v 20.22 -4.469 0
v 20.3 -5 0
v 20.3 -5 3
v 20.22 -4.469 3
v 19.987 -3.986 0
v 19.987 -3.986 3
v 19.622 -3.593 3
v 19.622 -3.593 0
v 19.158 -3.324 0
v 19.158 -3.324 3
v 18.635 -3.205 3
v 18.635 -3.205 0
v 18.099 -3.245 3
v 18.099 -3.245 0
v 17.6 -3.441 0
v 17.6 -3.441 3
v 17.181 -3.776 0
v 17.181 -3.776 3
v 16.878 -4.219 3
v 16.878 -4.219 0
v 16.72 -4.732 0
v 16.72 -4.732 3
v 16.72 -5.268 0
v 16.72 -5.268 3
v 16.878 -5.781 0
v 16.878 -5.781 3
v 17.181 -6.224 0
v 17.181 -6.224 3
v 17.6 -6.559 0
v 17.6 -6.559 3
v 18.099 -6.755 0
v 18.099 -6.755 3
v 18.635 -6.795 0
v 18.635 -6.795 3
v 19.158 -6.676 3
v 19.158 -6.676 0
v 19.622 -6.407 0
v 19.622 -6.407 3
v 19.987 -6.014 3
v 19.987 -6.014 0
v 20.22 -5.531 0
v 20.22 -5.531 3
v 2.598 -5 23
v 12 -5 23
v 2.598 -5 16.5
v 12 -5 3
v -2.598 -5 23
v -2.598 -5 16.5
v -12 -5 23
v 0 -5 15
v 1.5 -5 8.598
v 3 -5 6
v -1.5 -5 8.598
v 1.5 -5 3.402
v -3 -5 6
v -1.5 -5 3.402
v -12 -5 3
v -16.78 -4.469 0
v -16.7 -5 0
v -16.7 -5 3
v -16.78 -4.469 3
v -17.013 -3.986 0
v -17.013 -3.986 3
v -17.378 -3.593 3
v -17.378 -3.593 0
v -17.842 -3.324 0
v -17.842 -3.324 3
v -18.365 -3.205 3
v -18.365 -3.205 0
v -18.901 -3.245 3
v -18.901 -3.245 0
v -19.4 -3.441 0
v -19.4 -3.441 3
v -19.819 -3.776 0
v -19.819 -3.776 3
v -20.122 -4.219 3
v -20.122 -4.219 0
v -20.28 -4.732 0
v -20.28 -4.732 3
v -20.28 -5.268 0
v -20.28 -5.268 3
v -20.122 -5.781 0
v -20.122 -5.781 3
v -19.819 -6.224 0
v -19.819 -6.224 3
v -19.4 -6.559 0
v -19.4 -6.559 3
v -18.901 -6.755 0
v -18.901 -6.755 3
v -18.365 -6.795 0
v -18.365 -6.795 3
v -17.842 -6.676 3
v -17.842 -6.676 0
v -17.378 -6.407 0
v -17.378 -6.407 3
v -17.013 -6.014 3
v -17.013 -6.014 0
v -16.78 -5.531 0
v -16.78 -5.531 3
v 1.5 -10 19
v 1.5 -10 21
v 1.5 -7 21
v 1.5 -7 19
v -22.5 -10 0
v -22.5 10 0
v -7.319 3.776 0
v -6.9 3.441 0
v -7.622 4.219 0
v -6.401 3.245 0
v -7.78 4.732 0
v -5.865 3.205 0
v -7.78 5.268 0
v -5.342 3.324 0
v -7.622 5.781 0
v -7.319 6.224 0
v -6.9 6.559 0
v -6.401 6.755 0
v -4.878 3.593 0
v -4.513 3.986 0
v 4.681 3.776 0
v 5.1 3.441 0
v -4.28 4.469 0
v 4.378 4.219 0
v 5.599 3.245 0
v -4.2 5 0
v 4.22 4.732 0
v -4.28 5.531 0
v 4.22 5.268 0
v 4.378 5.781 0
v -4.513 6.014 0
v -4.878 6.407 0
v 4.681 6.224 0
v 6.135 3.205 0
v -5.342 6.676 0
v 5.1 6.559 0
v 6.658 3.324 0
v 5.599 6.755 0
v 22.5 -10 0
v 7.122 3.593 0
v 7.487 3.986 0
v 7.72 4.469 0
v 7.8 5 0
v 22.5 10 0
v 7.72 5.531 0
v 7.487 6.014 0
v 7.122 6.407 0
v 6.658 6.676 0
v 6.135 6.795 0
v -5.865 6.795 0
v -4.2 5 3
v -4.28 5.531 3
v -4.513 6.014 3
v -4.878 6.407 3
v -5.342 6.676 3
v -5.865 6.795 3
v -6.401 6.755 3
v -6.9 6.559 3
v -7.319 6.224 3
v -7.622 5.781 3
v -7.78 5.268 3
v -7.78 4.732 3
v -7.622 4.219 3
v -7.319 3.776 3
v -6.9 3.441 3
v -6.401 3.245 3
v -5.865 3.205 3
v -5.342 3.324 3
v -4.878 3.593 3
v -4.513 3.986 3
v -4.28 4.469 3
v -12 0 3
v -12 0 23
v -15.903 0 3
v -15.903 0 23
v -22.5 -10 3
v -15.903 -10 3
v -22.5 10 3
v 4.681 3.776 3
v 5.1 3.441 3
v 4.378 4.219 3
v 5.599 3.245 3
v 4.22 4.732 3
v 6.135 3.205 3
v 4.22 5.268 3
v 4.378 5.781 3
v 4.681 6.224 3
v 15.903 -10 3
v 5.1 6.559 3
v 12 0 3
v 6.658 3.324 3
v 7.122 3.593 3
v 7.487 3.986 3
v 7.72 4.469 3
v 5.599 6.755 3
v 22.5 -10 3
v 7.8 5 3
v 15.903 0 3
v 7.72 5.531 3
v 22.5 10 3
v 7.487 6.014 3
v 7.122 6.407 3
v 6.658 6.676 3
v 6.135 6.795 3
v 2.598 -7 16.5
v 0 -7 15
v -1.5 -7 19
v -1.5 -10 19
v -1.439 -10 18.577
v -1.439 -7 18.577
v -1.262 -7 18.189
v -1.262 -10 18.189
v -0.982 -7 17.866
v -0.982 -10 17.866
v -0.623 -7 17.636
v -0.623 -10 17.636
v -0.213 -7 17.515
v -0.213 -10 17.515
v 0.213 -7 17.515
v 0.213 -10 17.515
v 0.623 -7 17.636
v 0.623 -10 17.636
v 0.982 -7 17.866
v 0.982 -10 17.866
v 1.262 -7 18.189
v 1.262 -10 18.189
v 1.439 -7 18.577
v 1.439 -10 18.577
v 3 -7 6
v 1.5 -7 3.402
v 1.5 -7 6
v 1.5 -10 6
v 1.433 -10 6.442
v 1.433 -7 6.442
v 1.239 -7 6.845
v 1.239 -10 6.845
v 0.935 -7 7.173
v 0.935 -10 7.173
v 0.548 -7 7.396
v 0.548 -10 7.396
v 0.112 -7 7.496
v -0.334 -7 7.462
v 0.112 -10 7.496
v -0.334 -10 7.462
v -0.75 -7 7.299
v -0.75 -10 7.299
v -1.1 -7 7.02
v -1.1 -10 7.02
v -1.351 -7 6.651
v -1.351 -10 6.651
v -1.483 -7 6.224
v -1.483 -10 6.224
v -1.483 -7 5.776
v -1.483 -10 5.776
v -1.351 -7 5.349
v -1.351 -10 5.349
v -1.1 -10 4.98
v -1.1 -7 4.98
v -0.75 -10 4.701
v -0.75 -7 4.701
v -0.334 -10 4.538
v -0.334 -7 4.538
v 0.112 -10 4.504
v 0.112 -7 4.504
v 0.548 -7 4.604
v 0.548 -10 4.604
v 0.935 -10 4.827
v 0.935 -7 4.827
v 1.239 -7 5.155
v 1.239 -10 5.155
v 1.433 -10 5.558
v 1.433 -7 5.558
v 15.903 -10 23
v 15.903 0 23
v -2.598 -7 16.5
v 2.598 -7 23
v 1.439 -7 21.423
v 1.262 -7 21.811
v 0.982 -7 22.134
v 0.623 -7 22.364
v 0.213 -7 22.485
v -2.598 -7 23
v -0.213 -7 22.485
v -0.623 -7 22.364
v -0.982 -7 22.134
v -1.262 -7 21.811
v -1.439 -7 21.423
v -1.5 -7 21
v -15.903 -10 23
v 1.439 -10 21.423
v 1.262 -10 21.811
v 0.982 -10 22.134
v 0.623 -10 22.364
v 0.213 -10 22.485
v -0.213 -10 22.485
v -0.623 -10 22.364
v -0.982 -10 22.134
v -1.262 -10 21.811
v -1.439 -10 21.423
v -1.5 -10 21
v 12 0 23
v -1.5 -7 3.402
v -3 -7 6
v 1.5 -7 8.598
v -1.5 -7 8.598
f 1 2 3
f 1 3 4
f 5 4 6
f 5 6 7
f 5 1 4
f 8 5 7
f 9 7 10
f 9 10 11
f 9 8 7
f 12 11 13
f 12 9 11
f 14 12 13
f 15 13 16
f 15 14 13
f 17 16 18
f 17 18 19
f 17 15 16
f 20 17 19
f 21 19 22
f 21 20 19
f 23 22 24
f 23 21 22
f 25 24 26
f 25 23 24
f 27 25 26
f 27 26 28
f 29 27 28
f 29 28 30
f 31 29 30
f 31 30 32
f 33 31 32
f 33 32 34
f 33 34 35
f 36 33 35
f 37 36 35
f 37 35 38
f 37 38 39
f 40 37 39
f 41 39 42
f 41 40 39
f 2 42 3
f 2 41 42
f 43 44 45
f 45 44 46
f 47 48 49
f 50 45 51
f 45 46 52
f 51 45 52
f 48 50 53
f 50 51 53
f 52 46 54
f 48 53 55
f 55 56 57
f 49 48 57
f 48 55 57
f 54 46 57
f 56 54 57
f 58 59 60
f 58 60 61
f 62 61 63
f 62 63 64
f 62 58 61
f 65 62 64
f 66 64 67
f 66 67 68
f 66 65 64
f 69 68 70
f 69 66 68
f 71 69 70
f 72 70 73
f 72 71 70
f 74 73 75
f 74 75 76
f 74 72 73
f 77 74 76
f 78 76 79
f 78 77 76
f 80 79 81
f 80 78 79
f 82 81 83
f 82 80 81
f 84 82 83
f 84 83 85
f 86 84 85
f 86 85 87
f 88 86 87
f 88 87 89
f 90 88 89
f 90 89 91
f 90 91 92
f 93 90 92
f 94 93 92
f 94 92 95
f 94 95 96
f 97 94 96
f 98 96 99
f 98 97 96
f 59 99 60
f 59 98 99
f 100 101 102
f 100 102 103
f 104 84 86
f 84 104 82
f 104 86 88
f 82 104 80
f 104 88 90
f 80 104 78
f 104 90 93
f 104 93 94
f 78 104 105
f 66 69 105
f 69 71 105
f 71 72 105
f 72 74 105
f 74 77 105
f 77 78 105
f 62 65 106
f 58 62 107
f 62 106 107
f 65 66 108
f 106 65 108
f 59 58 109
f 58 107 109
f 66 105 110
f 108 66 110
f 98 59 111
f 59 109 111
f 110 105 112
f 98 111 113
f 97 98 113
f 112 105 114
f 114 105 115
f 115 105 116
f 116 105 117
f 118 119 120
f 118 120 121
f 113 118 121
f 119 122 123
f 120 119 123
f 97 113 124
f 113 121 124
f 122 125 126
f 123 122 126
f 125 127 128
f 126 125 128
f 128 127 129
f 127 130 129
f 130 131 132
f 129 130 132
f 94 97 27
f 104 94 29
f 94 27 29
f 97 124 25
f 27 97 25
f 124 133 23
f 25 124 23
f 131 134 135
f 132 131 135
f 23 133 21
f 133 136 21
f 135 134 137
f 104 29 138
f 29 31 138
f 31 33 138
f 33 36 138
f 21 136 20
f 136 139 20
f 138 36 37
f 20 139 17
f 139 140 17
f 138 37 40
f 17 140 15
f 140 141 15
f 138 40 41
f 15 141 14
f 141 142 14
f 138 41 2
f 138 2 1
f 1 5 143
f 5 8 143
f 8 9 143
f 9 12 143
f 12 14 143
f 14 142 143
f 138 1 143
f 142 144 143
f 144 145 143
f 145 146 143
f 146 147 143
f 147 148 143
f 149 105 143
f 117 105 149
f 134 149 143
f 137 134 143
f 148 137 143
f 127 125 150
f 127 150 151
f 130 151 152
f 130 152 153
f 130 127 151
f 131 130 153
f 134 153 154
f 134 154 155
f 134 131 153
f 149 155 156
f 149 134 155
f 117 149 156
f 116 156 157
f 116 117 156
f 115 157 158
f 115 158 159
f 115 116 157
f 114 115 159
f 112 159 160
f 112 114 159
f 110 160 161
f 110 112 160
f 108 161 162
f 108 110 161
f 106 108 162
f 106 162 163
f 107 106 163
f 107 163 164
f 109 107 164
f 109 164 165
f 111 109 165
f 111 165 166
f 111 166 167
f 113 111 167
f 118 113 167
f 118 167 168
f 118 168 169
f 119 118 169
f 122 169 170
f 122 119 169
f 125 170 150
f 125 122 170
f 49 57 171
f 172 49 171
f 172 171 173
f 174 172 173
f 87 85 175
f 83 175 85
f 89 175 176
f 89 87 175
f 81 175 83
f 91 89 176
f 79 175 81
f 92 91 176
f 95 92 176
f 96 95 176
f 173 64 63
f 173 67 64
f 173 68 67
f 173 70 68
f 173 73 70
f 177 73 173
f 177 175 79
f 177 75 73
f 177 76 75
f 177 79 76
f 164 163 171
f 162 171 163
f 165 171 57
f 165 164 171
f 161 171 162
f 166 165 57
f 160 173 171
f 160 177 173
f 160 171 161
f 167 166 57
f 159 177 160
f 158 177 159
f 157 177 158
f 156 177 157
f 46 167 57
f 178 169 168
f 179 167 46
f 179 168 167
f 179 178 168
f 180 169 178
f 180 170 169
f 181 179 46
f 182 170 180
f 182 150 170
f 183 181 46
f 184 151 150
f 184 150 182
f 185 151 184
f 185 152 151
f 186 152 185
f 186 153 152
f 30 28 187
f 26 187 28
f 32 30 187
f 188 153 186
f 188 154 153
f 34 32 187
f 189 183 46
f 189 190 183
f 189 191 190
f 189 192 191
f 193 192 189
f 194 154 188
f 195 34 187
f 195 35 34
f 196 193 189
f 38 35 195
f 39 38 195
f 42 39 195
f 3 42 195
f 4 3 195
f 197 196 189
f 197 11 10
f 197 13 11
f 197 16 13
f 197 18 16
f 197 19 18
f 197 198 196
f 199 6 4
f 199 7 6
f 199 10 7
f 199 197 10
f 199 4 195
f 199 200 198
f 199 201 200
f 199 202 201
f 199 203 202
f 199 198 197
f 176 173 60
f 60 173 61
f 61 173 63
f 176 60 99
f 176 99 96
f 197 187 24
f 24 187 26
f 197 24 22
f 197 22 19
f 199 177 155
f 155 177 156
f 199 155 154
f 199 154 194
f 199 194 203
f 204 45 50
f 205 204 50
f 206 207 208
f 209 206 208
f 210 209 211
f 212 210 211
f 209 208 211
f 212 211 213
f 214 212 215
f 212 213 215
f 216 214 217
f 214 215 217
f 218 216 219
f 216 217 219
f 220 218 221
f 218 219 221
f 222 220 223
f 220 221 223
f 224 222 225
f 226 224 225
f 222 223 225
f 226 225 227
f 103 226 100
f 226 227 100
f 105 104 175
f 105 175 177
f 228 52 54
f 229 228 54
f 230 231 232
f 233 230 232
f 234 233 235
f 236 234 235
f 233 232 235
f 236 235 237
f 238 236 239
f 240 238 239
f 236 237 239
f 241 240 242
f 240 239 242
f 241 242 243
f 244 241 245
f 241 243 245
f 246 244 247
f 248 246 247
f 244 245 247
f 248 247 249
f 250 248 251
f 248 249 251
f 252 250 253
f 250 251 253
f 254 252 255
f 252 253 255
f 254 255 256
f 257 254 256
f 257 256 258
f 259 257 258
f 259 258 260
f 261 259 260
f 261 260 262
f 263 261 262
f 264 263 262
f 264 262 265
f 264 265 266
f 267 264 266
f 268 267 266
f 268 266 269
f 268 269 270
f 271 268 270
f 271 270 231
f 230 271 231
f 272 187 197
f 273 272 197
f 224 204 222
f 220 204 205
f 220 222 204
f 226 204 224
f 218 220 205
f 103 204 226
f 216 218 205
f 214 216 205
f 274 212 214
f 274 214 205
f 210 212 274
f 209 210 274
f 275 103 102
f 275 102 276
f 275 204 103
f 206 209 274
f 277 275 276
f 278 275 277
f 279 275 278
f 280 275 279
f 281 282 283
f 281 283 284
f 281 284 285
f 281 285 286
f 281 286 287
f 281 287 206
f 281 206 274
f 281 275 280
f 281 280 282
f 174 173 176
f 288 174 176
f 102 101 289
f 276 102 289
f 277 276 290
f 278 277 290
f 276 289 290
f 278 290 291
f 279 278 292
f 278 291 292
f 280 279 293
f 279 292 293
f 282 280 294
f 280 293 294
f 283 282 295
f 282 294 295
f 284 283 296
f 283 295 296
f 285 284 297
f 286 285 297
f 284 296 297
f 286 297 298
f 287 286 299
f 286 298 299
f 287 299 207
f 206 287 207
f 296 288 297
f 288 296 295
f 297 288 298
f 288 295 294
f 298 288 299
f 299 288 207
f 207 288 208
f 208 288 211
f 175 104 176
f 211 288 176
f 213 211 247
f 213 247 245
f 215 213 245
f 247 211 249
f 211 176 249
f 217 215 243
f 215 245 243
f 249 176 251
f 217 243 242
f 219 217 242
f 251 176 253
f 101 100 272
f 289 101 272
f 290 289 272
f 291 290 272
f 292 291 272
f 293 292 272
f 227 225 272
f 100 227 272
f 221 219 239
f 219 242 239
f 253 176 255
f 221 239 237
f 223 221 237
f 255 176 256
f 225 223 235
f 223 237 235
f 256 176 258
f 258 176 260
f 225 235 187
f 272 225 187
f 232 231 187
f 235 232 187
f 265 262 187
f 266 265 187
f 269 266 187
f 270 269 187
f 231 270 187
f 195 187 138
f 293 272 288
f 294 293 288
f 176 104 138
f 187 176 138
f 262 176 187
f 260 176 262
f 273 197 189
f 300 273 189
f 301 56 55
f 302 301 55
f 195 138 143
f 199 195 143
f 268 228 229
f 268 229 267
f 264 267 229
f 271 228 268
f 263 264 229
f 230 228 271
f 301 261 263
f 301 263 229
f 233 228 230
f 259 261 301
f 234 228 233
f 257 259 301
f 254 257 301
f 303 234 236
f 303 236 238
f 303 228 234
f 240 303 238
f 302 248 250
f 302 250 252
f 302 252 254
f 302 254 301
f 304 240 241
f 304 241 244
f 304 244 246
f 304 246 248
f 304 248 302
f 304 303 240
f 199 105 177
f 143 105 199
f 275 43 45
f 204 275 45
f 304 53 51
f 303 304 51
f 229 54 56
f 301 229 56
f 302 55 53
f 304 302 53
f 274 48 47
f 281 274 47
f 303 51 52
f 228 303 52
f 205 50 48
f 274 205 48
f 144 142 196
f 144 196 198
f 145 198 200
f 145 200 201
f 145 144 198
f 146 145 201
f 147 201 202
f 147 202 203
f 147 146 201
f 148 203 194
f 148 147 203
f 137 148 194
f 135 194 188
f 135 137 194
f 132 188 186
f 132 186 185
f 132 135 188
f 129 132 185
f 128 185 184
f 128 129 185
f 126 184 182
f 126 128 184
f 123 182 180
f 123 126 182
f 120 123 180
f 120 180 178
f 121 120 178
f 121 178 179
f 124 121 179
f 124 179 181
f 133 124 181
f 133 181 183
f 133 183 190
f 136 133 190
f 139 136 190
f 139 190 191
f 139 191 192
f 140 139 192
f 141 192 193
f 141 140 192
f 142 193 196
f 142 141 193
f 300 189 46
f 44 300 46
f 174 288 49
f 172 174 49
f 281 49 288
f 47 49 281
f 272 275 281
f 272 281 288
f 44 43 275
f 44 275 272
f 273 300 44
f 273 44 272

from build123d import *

# Parameters (mm, degrees)
SKETCH002_R  = 1.5
PAD003_DEPTH = 5
PAD002_DEPTH = 2
SKETCH_W     = 45
SKETCH_H     = 20
SKETCH_R     = 1.8
PAD_DEPTH    = 3
PAD001_DEPTH = 20


with BuildPart() as mount:
    # Sketch002 → Pad003 (new body)
    with BuildSketch(Plane.XZ.offset(10)):
        with Locations((0, 6)):
            Circle(SKETCH002_R)
        with BuildLine():
            ThreePointArc((1.5, 21), (0, 22.5), (-1.5, 21))
            Line((-1.5, 21), (-1.5, 19))
            ThreePointArc((-1.5, 19), (0, 17.5), (1.5, 19))
            Line((1.5, 21), (1.5, 19))
        make_face()
    extrude(amount=-PAD003_DEPTH)


with BuildPart() as cutblock:
    # Sketch003 → Pad002 (new body)
    with BuildSketch(Plane(origin=(0, -5, 0), x_dir=(-1, 0, 0), z_dir=(0, 1, 0))):
        Polygon((-1.5, 3.401924), (1.5, 3.401924), (3, 6), (1.5, 8.598076), (-1.5, 8.598076), (-3, 6), align=None)
        Polygon((2.598075, 16.499999), (2.598075, 23), (0, 24.499999), (-2.598075, 23), (-2.598075, 16.499999), (0, 15), align=None)
    extrude(amount=-PAD002_DEPTH)

    # Fusion001: union Mount
    add(mount.part)


with BuildPart() as base:
    # Sketch → Pad (new body)
    with BuildSketch(Plane.XY):
        Rectangle(SKETCH_W, SKETCH_H)
        with Locations((-6, 5)):
            Circle(SKETCH_R, mode=Mode.SUBTRACT)
        with Locations((6, 5)):
            Circle(SKETCH_R, mode=Mode.SUBTRACT)
        with Locations((-18.5, -5)):
            Circle(SKETCH_R, mode=Mode.SUBTRACT)
        with Locations((18.5, -5)):
            Circle(SKETCH_R, mode=Mode.SUBTRACT)
    extrude(amount=PAD_DEPTH)


with BuildPart() as final:
    # Sketch001 → Pad001 (new body)
    with BuildSketch(Plane.XY.offset(3)):
        Polygon((-12, 0), (-15.90274, 0), (-15.90274, -10), (15.90274, -10), (15.90274, 0), (12, 0), (12, -5), (-12, -5), align=None)
    extrude(amount=PAD001_DEPTH)

    # Fusion: union Base
    add(base.part)

    # Cut: cut CutBlock
    add(cutblock.part, mode=Mode.SUBTRACT)


solid = final.part
